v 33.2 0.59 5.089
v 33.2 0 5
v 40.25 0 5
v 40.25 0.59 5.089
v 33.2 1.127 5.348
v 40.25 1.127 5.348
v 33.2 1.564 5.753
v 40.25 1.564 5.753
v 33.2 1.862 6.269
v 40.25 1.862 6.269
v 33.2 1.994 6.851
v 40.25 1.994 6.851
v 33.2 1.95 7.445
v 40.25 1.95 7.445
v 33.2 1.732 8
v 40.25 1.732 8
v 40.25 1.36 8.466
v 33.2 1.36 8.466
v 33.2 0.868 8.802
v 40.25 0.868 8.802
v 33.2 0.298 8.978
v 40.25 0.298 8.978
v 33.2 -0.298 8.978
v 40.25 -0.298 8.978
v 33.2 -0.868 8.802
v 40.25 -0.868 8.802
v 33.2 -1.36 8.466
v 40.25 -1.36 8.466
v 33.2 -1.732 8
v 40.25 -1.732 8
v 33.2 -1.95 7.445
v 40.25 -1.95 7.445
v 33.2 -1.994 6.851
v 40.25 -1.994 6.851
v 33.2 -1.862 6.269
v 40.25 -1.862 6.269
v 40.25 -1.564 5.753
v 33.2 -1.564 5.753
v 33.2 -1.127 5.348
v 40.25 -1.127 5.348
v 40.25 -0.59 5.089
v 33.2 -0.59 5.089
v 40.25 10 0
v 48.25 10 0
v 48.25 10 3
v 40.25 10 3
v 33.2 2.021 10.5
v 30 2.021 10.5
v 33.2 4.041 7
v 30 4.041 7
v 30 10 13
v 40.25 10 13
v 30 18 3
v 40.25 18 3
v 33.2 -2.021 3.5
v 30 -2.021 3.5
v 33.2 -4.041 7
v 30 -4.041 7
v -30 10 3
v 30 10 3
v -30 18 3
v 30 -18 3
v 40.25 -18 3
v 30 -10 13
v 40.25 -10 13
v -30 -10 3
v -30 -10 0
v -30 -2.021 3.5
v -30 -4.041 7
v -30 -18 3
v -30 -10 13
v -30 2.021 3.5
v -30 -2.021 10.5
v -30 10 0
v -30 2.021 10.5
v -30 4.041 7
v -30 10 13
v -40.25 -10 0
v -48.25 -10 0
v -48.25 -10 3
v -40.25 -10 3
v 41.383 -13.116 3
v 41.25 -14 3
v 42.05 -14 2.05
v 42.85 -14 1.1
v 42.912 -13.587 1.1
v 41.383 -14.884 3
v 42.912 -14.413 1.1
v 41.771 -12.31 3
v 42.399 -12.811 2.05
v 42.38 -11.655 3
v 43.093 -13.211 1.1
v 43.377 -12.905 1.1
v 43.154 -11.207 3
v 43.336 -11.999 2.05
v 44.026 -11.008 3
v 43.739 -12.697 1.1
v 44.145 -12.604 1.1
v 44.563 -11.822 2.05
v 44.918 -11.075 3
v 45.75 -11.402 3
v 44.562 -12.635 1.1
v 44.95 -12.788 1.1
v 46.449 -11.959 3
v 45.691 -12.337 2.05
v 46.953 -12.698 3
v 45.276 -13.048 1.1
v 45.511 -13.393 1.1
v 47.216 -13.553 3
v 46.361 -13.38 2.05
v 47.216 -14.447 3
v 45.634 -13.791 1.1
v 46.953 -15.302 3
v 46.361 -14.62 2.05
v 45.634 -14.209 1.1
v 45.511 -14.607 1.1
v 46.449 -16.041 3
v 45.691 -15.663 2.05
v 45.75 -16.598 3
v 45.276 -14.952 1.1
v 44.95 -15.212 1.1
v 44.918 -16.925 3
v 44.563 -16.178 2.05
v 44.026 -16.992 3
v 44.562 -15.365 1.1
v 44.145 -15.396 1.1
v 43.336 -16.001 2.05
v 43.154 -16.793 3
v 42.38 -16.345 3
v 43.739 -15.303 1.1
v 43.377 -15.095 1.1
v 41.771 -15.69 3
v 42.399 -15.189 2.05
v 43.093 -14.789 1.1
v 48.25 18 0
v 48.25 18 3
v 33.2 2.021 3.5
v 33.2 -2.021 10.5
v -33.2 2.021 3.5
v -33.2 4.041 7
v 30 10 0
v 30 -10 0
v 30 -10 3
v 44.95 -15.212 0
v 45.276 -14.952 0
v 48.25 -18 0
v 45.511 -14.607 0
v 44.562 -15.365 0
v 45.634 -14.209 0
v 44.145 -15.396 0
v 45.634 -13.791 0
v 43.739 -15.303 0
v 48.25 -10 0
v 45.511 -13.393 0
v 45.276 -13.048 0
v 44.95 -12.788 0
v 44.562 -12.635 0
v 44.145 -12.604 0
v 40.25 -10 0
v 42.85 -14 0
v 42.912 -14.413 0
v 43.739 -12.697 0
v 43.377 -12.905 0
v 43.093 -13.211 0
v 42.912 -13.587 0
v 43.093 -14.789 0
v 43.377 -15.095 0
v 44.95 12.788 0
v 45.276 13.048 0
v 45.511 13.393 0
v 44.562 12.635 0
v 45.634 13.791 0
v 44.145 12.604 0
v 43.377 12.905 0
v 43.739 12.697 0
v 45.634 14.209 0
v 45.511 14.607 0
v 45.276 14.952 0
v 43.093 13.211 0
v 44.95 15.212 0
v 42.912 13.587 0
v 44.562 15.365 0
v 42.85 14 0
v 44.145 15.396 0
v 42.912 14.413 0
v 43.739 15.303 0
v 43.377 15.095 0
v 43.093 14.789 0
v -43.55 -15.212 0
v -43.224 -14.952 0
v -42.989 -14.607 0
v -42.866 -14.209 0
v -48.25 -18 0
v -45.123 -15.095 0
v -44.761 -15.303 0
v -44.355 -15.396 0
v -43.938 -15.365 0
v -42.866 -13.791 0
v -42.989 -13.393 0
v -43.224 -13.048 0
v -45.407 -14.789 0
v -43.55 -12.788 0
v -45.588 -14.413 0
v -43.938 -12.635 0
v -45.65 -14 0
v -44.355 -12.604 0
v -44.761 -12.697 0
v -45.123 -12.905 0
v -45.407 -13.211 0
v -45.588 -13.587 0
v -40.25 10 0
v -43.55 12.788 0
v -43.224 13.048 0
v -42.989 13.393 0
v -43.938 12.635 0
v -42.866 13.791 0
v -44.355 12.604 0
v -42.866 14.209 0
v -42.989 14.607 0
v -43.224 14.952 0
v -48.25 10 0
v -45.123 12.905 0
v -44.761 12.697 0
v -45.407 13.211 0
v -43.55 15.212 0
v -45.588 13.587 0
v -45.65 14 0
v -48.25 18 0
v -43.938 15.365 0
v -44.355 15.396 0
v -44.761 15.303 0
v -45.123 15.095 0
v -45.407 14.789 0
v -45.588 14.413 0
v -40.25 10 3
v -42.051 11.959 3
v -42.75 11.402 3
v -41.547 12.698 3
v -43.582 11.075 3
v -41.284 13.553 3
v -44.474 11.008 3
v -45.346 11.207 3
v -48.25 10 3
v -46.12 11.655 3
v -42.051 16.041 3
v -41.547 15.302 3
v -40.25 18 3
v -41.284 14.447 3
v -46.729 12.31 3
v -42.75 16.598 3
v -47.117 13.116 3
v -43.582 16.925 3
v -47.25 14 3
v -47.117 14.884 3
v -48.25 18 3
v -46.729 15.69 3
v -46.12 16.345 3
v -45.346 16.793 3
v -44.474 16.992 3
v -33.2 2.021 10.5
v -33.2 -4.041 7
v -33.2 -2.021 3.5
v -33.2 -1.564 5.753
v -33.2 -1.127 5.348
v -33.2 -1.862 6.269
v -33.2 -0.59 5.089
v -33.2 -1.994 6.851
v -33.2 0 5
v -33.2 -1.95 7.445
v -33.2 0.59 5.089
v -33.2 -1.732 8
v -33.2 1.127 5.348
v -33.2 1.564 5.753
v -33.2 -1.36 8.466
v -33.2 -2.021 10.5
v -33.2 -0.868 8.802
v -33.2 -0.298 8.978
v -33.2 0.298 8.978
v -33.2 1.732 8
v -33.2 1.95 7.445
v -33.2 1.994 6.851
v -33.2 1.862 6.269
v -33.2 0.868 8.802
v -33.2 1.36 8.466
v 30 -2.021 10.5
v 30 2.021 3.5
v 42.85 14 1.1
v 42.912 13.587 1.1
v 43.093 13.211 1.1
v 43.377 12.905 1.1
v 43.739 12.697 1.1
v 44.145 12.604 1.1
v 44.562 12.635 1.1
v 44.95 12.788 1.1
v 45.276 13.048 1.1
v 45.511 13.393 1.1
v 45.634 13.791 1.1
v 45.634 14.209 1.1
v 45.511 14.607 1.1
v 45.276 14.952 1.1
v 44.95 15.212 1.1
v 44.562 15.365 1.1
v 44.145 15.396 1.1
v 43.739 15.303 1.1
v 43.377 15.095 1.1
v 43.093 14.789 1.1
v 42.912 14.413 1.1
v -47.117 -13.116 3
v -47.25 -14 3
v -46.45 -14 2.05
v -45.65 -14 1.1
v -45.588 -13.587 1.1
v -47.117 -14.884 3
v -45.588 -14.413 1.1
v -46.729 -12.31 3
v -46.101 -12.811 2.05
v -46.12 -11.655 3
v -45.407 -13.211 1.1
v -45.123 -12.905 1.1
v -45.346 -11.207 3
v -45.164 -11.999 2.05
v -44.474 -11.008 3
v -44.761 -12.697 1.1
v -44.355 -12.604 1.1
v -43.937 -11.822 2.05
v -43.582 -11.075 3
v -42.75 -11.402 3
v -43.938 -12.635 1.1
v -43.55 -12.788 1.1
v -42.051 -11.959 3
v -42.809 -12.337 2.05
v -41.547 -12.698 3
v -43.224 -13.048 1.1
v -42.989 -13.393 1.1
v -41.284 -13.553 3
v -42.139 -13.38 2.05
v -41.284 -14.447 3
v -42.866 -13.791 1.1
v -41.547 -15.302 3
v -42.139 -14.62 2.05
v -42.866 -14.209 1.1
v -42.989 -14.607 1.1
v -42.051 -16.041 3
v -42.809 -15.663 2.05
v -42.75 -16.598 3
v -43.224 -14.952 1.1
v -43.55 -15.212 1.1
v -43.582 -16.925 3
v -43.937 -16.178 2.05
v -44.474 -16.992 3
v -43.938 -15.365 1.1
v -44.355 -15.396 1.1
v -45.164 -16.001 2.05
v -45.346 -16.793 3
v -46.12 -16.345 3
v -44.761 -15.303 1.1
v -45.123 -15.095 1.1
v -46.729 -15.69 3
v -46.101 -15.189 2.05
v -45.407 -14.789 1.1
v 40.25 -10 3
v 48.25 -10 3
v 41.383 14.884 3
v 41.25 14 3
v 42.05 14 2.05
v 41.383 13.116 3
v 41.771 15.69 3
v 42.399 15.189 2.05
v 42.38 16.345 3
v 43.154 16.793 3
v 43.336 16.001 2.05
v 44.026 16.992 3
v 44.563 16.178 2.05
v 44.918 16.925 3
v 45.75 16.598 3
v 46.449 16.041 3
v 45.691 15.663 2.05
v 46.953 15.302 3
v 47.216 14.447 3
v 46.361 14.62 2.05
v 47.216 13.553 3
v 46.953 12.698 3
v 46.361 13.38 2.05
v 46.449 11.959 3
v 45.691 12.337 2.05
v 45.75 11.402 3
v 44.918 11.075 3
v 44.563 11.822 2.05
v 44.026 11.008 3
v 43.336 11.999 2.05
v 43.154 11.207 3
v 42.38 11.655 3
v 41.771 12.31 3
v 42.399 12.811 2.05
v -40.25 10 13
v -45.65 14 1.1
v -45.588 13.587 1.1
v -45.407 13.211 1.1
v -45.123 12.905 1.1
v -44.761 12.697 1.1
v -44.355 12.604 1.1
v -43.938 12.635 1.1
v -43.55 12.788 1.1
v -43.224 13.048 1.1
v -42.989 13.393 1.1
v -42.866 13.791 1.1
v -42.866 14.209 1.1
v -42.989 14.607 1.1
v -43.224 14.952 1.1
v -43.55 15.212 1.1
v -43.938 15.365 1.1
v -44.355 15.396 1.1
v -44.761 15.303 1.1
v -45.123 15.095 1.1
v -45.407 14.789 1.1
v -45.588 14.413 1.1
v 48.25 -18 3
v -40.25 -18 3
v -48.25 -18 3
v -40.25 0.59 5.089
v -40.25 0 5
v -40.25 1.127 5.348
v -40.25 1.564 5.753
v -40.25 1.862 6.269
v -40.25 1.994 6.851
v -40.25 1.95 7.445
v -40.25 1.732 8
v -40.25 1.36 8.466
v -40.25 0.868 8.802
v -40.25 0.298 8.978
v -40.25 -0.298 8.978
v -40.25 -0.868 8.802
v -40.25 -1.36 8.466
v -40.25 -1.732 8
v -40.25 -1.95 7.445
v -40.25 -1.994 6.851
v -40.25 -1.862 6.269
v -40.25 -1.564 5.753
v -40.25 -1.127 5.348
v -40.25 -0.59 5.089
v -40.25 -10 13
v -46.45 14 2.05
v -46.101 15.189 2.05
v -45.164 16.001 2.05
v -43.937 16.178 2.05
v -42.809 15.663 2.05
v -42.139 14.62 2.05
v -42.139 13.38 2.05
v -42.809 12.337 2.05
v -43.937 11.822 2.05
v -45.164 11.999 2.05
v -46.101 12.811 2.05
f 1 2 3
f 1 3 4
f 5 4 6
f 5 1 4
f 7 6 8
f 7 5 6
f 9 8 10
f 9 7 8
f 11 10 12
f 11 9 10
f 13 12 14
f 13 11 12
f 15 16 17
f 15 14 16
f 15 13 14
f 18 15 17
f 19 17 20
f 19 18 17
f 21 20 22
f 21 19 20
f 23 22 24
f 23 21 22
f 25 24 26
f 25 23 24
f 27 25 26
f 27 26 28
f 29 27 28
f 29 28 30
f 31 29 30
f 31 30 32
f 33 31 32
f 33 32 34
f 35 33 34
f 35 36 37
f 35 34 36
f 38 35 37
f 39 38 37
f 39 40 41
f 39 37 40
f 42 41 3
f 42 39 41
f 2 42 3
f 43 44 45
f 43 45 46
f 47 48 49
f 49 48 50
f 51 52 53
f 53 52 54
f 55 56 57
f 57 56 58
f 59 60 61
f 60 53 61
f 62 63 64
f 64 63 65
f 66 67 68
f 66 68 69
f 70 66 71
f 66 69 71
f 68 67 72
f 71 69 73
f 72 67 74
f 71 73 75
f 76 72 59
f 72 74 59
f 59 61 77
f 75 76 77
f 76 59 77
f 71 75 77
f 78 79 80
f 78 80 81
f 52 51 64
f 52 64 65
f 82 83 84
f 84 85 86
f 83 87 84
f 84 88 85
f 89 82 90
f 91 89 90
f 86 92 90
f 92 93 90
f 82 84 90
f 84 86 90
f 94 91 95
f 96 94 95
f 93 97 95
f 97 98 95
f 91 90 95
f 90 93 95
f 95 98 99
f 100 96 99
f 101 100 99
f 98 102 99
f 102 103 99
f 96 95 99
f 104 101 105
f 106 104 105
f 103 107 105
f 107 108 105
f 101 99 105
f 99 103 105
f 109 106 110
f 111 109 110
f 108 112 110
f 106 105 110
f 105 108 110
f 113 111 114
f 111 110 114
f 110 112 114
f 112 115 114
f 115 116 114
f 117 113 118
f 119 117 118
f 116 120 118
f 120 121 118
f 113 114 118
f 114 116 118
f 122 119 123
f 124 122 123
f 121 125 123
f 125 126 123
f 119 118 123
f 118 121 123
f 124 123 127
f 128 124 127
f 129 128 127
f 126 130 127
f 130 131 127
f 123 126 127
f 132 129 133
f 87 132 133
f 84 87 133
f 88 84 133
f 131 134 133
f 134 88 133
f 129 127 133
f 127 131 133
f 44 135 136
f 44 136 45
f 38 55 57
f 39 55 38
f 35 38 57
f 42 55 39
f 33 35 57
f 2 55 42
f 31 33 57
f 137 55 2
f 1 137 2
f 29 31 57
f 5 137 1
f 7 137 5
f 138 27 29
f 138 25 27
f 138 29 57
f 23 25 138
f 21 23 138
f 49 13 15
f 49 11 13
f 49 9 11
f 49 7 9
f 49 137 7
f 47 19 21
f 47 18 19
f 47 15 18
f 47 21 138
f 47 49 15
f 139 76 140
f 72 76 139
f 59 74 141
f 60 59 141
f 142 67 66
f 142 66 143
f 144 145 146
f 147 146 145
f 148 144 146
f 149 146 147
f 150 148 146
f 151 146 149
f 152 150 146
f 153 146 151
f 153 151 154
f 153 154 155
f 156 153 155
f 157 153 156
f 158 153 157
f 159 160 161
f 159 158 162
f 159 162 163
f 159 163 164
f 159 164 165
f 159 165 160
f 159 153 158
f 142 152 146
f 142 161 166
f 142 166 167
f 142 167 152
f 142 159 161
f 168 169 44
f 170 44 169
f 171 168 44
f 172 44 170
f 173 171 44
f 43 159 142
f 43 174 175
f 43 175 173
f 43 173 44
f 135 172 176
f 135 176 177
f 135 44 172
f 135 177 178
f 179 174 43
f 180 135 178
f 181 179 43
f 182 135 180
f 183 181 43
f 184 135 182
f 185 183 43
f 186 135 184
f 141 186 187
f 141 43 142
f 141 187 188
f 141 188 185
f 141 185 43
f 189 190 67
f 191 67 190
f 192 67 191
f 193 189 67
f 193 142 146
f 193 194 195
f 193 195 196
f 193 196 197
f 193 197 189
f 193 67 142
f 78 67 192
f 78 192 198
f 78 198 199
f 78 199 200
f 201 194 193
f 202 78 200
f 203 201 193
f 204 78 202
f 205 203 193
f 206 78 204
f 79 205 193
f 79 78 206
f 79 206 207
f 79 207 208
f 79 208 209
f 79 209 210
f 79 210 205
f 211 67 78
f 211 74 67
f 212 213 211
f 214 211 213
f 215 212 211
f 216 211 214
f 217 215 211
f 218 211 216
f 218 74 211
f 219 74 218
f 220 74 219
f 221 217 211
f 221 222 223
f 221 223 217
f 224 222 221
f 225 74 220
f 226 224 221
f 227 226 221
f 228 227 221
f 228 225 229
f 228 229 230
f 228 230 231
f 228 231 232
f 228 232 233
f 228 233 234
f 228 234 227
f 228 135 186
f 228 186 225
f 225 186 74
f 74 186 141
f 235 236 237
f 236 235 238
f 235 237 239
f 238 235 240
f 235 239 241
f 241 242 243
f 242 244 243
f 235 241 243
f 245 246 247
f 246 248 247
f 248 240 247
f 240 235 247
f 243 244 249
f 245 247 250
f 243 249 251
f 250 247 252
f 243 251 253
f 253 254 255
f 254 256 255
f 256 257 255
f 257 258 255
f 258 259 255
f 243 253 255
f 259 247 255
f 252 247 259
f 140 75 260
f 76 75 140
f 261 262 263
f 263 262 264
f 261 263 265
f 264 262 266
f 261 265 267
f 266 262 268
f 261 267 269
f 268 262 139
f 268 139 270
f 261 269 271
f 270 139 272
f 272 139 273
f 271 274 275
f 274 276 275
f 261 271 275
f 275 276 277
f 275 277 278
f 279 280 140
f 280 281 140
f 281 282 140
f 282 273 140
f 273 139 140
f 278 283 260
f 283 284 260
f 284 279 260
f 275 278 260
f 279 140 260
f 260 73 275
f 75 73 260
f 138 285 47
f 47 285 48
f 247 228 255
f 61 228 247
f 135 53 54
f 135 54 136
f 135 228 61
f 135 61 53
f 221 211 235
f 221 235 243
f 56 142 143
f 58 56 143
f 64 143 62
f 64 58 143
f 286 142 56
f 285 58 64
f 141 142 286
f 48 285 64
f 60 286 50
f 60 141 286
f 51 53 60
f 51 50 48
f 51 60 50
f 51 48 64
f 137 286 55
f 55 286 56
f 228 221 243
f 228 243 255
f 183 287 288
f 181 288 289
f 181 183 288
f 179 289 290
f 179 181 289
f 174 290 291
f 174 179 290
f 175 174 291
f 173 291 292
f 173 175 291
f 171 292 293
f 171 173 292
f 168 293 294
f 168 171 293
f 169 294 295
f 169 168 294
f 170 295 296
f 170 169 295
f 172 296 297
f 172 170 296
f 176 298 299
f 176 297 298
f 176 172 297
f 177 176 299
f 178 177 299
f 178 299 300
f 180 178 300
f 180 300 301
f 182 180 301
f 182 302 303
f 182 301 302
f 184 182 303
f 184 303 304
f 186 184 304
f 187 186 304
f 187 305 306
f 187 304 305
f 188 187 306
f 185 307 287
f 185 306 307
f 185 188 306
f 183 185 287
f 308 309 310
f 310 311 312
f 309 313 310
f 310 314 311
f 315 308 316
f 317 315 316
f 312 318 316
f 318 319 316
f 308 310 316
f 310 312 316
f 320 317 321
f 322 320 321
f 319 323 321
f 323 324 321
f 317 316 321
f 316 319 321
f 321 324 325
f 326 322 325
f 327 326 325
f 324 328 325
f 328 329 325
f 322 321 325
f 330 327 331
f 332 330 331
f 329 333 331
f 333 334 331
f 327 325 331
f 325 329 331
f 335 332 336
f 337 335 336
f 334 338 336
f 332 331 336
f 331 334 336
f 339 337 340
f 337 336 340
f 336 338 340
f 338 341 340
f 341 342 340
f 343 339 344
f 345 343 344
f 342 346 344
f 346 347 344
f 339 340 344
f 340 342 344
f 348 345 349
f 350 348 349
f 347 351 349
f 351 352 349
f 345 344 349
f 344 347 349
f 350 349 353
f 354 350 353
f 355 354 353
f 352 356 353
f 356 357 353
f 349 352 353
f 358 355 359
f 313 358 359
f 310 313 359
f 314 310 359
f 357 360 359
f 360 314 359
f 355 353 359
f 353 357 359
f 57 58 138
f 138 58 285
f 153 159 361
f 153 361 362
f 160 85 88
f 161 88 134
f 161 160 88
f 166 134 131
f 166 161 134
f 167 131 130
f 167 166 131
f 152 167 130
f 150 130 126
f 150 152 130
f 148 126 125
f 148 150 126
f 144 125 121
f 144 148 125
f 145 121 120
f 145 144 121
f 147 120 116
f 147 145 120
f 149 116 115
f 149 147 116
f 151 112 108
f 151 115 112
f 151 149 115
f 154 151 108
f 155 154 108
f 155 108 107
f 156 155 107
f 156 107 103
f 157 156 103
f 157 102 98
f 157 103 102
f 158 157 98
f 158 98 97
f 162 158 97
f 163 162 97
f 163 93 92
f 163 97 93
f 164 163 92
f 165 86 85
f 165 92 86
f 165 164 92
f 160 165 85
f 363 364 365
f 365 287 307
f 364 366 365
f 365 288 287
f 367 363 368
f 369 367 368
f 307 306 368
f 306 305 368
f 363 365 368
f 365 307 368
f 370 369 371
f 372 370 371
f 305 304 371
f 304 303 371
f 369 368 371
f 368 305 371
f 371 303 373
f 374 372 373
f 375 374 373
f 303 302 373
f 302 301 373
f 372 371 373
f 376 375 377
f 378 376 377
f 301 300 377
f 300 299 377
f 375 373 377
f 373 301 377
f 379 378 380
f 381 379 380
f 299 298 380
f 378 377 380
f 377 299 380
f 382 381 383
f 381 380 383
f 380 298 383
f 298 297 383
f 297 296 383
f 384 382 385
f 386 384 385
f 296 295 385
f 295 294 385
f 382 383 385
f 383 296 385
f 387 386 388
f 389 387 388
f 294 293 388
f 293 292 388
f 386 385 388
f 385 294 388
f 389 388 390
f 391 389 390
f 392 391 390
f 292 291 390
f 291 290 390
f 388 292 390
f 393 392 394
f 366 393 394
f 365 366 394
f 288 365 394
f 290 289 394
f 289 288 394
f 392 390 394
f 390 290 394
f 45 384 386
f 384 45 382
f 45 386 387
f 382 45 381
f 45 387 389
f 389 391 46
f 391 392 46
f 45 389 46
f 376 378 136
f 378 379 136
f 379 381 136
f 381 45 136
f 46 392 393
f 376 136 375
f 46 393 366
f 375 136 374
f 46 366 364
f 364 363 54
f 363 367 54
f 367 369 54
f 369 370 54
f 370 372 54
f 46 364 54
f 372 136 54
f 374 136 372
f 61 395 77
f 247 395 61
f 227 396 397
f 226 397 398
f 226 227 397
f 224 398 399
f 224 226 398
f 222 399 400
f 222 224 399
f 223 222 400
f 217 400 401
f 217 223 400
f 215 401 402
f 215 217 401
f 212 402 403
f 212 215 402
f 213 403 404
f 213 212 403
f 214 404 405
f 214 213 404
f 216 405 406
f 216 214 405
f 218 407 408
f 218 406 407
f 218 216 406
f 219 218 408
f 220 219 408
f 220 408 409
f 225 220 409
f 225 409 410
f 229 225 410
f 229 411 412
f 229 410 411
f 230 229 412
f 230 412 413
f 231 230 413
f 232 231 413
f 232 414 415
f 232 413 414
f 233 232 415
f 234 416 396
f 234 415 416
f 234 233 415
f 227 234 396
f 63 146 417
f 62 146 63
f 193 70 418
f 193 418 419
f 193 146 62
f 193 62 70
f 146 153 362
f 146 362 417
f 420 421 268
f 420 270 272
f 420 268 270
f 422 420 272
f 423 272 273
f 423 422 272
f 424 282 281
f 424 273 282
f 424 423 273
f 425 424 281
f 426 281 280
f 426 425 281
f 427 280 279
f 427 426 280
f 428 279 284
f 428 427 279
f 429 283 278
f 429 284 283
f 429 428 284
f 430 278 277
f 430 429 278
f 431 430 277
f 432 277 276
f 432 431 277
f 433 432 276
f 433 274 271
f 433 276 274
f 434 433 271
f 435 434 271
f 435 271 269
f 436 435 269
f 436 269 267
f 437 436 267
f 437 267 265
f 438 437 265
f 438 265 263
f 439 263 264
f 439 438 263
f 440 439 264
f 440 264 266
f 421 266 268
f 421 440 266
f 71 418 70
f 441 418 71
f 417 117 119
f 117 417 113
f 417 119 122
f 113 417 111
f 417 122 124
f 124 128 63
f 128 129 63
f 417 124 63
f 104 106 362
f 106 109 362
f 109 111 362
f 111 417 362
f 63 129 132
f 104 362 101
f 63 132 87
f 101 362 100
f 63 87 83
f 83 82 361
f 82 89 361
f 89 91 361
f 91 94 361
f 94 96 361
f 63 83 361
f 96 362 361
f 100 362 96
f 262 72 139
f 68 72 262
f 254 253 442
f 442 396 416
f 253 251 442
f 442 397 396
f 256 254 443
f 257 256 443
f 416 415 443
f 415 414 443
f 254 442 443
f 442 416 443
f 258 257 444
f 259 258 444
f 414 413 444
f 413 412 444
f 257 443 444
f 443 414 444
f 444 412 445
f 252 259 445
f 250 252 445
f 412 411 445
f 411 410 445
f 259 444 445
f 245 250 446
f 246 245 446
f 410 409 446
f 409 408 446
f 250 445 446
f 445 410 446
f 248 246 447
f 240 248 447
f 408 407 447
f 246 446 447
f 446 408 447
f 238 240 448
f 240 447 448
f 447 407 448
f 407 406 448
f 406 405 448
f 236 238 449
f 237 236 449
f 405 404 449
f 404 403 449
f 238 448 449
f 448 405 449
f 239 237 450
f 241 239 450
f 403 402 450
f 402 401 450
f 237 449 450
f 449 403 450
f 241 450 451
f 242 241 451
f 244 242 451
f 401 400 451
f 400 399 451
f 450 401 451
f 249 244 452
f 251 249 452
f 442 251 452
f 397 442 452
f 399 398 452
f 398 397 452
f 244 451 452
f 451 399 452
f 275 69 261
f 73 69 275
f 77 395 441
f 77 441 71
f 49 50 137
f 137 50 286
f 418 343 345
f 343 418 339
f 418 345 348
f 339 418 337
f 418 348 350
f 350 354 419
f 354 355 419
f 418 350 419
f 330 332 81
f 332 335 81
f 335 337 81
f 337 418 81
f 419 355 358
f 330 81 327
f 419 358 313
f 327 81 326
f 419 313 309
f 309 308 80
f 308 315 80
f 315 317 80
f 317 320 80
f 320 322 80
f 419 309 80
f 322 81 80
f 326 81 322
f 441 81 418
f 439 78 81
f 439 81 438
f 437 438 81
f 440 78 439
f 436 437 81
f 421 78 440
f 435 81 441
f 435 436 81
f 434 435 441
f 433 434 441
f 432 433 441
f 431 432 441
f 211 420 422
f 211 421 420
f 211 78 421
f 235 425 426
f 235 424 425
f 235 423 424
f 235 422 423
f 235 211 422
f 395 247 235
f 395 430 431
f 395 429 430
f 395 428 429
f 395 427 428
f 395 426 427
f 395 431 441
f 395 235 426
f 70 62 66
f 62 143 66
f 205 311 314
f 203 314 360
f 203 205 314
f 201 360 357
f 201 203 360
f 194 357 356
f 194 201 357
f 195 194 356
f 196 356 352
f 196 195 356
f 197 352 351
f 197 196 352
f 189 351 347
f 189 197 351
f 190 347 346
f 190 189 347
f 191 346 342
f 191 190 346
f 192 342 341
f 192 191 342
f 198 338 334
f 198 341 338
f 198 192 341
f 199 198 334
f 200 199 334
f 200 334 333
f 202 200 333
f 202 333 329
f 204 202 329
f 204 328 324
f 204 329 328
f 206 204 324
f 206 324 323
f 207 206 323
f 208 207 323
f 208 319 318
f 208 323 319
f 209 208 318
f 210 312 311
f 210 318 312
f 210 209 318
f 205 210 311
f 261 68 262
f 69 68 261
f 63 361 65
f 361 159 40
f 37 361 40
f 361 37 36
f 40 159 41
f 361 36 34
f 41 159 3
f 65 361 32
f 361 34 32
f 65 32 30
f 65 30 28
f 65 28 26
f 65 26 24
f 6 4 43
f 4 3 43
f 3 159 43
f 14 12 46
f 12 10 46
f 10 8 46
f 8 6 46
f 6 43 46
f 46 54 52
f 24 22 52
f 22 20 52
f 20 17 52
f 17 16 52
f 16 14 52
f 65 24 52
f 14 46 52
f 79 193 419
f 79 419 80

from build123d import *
from OCP.BRepFilletAPI import BRepFilletAPI_MakeChamfer

# Parameters (mm, degrees)
SKETCH_1_W               = 60
SKETCH_1_H               = 20
EXTRUDE_1_DEPTH          = 3
SKETCH_2_W               = 10.25
SKETCH_2_H               = 20
EXTRUDE_2_DEPTH          = 10
CUT_EXTRUDE_1_DEPTH      = 54.113675264
CUT_EXTRUDE_1_DEPTH_BACK = 54.113675264
SKETCH_3_R               = 2
SKETCH_4_R               = 1.4
CUT_EXTRUDE_2_DEPTH      = 54.113675264
EXTRUDE_3_DEPTH          = 10.25
EXTRUDE_4_DEPTH          = 10.25
CUT_EXTRUDE_3_DEPTH      = 3.2
CHAMFER_1_SIZE           = 1.6
CHAMFER_1_SIZE2          = 1.9


with BuildPart() as part:
    # 스케치1 → 보스-돌출1 (new body)
    with BuildSketch(Plane.XY):
        Polygon((-48.25, 18), (48.25, 18), (48.25, 10), (40.25, 10), (40.25, -10), (48.25, -10), (48.25, -18), (-48.25, -18), (-48.25, -10), (-40.25, -10), (-40.25, 10), (-48.25, 10), align=None)
        Rectangle(SKETCH_1_W, SKETCH_1_H, mode=Mode.SUBTRACT)
    extrude(amount=EXTRUDE_1_DEPTH)

    # 스케치2 → 보스-돌출2 (add)
    with BuildSketch(Plane.XY.offset(3)):
        with Locations((35.125, 0)):
            Rectangle(SKETCH_2_W, SKETCH_2_H)
        with Locations((-35.125, 0)):
            Rectangle(SKETCH_2_W, SKETCH_2_H)
    extrude(amount=EXTRUDE_2_DEPTH)

    # 스케치3 → 컷-돌출1 (cut, two sides: drawn at the far end of the back side and taken through both)
    with BuildSketch(Plane(origin=(0, 0, 0), x_dir=(0, 0, -1), z_dir=(1, 0, 0)).offset(-CUT_EXTRUDE_1_DEPTH_BACK)):
        with Locations((-7, 0)):
            Circle(SKETCH_3_R)
    extrude(amount=CUT_EXTRUDE_1_DEPTH + CUT_EXTRUDE_1_DEPTH_BACK, mode=Mode.SUBTRACT)

    # 스케치4 → 컷-돌출2 (cut, through all)
    with BuildSketch(Plane.XY):
        with Locations(Location((44.25, 14, 0), (0, 0, 180))):
            Circle(SKETCH_4_R)
        with Locations(Location((-44.25, 14, 0), (0, 0, 180))):
            Circle(SKETCH_4_R)
        with Locations(Location((44.25, -14, 0), (0, 0, 180))):
            Circle(SKETCH_4_R)
        with Locations(Location((-44.25, -14, 0), (0, 0, 180))):
            Circle(SKETCH_4_R)
    extrude(amount=CUT_EXTRUDE_2_DEPTH, mode=Mode.SUBTRACT)

    # 스케치5 → 보스-돌출3 (add)
    with BuildSketch(Plane(origin=(40.25, 0, 0), x_dir=(0, 0, -1), z_dir=(1, 0, 0))):
        Polygon((-13, 10), (-3, 18), (-3, 10), align=None)
        Polygon((-13, -10), (-3, -10), (-3, -18), align=None)
    extrude(amount=-EXTRUDE_3_DEPTH)

    # 스케치6 → 보스-돌출4 (add)
    with BuildSketch(Plane.ZY.offset(40.25)):
        Polygon((3, 18), (3, 10), (13, 10), align=None)
        Polygon((3, -10), (3, -18), (13, -10), align=None)
    extrude(amount=-EXTRUDE_4_DEPTH)

    # 스케치7 → 컷-돌출3 (cut)
    with BuildSketch(Plane.ZY.offset(-30)):
        Polygon((7, 4.041451884), (3.5, 2.020725942), (3.5, -2.020725942), (7, -4.041451884), (10.5, -2.020725942), (10.5, 2.020725942), align=None)
    cut_extrude_3 = extrude(amount=-CUT_EXTRUDE_3_DEPTH, mode=Mode.SUBTRACT)

    # 대칭 복사2: 컷-돌출3 across plane
    add(cut_extrude_3.mirror(Plane(origin=(0, 0, 0), x_dir=(0, 0, 1), z_dir=(1, 0, 0))), mode=Mode.SUBTRACT)

    # 모따기1: one chamfer whose edges measure the first distance from different faces: ONE call of the kernel's chamfer builder (chamfer() names one face for all edges)
    chamfer_1_edges_1 = [part.edges().sort_by_distance(p)[0] for p in [
        (45.65, -14, 3),
    ]]
    chamfer_1_side_1 = [part.faces().sort_by_distance(p)[0] for p in [
        (44.25, -17.886862915, 3),
    ]]
    chamfer_1_edges_2 = [part.edges().sort_by_distance(p)[0] for p in [
        (-42.85, -14, 3),
    ]]
    chamfer_1_side_2 = [part.faces().sort_by_distance(p)[0] for p in [
        (-44.25, -17.886862915, 3),
    ]]
    chamfer_1_edges_3 = [part.edges().sort_by_distance(p)[0] for p in [
        (45.65, 14, 3),
    ]]
    chamfer_1_side_3 = [part.faces().sort_by_distance(p)[0] for p in [
        (40.363137085, 14, 3),
    ]]
    chamfer_1_edges_4 = [part.edges().sort_by_distance(p)[0] for p in [
        (-42.85, 14, 3),
    ]]
    chamfer_1_side_4 = [part.faces().sort_by_distance(p)[0] for p in [
        (-40.363137085, 14, 3),
    ]]
    chamfer_1 = BRepFilletAPI_MakeChamfer(part.part.solid().wrapped)
    for e in chamfer_1_edges_1:
        chamfer_1.Add(CHAMFER_1_SIZE, CHAMFER_1_SIZE2, e.wrapped, chamfer_1_side_1[0].wrapped)  # the first distance lies on this face
    for e in chamfer_1_edges_2:
        chamfer_1.Add(CHAMFER_1_SIZE, CHAMFER_1_SIZE2, e.wrapped, chamfer_1_side_2[0].wrapped)  # the first distance lies on this face
    for e in chamfer_1_edges_3:
        chamfer_1.Add(CHAMFER_1_SIZE, CHAMFER_1_SIZE2, e.wrapped, chamfer_1_side_3[0].wrapped)  # the first distance lies on this face
    for e in chamfer_1_edges_4:
        chamfer_1.Add(CHAMFER_1_SIZE, CHAMFER_1_SIZE2, e.wrapped, chamfer_1_side_4[0].wrapped)  # the first distance lies on this face
    add(Compound.cast(chamfer_1.Shape()), mode=Mode.REPLACE)


solid = part.part
